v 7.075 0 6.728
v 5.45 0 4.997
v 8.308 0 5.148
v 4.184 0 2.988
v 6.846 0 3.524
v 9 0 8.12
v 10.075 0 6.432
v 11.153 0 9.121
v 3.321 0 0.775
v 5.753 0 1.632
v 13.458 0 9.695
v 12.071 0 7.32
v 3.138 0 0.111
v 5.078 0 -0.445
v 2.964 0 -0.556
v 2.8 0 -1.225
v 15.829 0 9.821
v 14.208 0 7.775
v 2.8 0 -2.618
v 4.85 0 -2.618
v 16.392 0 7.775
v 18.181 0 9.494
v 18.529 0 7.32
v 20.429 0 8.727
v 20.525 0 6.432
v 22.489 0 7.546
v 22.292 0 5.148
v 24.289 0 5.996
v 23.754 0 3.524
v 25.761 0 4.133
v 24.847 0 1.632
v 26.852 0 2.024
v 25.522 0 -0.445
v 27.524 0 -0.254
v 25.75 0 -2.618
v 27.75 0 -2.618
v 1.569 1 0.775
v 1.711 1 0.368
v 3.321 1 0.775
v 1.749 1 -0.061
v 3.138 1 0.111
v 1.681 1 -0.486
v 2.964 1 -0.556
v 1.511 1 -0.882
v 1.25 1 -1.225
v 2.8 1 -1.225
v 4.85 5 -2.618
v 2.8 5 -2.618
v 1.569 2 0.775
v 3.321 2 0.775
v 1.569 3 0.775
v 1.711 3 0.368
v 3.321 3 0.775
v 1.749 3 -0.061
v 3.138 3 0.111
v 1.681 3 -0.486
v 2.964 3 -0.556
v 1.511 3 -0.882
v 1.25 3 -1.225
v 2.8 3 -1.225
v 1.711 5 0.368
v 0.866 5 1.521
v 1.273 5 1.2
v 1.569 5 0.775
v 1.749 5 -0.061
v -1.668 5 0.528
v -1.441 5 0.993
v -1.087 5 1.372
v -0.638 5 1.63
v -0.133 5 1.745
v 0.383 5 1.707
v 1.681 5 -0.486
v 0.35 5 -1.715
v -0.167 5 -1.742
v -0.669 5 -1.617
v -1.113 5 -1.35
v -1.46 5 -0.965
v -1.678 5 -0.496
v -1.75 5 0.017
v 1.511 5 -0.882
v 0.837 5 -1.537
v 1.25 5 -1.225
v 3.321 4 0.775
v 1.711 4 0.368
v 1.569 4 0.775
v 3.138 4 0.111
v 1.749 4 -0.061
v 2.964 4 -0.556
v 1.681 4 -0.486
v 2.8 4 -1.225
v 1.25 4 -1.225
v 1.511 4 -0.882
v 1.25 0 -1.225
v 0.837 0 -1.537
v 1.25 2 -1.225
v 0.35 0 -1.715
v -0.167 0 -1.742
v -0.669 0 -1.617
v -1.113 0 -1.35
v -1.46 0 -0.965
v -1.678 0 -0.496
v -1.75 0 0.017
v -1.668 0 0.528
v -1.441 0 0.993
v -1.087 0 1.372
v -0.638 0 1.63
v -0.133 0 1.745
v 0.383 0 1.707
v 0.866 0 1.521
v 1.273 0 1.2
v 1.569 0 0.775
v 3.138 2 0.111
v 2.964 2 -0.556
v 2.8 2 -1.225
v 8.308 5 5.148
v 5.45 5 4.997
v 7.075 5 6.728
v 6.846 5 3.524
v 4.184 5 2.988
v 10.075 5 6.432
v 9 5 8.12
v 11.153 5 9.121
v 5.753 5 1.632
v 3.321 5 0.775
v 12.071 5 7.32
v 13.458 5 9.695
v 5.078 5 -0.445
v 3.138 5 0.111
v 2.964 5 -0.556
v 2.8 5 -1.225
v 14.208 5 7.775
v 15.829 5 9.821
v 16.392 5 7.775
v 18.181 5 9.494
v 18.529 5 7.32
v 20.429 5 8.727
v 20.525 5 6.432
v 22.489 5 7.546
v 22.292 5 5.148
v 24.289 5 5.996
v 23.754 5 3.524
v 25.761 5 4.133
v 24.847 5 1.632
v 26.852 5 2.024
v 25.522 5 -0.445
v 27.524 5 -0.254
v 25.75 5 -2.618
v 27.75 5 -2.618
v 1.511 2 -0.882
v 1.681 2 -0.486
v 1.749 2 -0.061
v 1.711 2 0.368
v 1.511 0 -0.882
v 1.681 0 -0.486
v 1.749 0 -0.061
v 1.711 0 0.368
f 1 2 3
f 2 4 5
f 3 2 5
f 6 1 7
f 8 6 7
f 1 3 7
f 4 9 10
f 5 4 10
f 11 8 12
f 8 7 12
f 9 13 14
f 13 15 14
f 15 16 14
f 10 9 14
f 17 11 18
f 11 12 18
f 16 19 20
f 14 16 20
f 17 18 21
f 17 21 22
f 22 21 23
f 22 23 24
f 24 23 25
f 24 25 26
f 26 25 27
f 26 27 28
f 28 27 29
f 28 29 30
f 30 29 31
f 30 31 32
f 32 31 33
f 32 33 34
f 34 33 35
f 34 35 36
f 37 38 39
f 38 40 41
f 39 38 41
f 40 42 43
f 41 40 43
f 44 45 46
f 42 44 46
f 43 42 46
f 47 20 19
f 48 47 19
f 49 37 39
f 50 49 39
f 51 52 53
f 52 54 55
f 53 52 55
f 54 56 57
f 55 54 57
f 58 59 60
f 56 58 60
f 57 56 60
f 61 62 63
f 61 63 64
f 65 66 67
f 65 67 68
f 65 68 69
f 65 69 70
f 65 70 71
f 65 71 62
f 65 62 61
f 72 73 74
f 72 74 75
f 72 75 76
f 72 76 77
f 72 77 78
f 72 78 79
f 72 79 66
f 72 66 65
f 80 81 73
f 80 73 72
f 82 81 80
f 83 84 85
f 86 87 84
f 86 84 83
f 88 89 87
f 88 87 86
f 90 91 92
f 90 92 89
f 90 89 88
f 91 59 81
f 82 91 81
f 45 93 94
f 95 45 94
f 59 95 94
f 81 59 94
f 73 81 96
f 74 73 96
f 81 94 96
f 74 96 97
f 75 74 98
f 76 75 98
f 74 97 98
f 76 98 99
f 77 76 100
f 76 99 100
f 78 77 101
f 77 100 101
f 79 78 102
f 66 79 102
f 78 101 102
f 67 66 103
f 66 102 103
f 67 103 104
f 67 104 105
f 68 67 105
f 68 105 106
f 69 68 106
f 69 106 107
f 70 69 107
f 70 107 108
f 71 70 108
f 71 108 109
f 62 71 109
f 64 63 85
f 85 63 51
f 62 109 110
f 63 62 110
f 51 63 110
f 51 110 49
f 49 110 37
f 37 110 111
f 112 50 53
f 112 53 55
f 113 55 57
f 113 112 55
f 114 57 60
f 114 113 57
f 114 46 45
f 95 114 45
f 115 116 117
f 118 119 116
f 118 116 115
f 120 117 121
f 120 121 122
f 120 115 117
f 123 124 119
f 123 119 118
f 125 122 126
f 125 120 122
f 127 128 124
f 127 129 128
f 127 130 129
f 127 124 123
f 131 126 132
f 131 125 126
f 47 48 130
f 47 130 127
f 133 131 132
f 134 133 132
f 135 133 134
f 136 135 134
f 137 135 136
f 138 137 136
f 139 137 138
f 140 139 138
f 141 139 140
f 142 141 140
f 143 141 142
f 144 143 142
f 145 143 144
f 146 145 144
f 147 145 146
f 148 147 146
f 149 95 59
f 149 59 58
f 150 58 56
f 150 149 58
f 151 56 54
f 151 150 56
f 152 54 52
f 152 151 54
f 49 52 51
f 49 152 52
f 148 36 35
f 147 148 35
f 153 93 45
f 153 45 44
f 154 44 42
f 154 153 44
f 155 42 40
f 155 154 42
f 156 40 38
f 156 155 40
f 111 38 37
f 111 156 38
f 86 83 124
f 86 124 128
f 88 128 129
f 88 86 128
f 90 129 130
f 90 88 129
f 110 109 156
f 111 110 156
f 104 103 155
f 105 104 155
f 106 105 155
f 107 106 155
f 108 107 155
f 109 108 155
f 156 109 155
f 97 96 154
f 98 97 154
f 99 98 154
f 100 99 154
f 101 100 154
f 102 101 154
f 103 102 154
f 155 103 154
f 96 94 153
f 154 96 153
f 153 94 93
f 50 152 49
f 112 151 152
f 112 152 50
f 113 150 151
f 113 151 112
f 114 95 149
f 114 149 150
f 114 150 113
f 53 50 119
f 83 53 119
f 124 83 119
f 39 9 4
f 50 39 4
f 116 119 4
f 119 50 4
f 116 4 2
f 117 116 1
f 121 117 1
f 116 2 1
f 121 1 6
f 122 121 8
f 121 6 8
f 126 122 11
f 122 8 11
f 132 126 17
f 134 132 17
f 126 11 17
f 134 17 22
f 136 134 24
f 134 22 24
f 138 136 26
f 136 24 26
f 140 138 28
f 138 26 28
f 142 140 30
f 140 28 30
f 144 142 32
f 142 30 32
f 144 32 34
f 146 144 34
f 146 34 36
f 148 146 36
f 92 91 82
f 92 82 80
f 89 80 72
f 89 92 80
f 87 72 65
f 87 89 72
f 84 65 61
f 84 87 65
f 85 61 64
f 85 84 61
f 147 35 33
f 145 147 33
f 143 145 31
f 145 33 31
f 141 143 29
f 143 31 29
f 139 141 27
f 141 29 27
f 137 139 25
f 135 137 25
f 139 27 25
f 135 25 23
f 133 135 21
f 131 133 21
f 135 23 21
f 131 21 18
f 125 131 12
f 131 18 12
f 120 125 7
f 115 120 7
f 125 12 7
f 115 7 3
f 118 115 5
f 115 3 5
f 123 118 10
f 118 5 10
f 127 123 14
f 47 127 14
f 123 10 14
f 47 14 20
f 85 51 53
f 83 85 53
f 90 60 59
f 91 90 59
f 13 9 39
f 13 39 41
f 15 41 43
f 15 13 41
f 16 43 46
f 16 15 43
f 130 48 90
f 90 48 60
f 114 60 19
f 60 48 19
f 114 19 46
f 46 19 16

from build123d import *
from build123d.topology import SkipClean

# Parameters (mm, degrees)
BOSS_EXTRUDE2_DEPTH = 5
CUT_EXTRUDE1_START  = -1
CUT_EXTRUDE1_DEPTH  = 1
CUT_EXTRUDE2_START  = -2
CUT_EXTRUDE2_DEPTH  = 1
CUT_EXTRUDE3_START  = -2
CUT_EXTRUDE3_DEPTH  = 1


with BuildPart() as part:
    # Sketch2 → Boss-Extrude2 (new body)
    with BuildSketch(Plane(origin=(0, 0, 0), x_dir=(1, 0, 0), z_dir=(0, 1, 0))):
        with BuildLine():
            Line((4.85, 2.618089507), (2.8, 2.618089507))
            Line((2.8, 2.618089507), (2.8, 1.224744871))
            Line((2.8, 1.224744871), (1.25, 1.224744871))
            ThreePointArc((1.25, 1.224744871), (-1.728167758, -0.275565237), (1.568910286, -0.775255129))
            Line((1.568910286, -0.775255129), (3.321364344, -0.775255129))
            ThreePointArc((3.321364344, -0.775255129), (17.012963234, -9.713506373), (27.75, 2.618089507))
            Line((27.75, 2.618089507), (25.75, 2.618089507))
            ThreePointArc((25.75, 2.618089507), (15.3, -7.831910493), (4.85, 2.618089507))
        make_face()
    extrude(amount=BOSS_EXTRUDE2_DEPTH)

    # Sketch6 → Cut-Extrude1 (cut)
    with SkipClean():  # the faces are left unmerged after this step: merging them gives an invalid solid
        with BuildSketch(Plane(origin=(0, 5, 0), x_dir=(1, 0, 0), z_dir=(0, 1, 0)).offset(CUT_EXTRUDE1_START)):
            with BuildLine():
                Line((2.8, 1.224744871), (1.25, 1.224744871))
                ThreePointArc((1.25, 1.224744871), (1.728167758, 0.275565237), (1.568910286, -0.775255129))
                Line((1.568910286, -0.775255129), (3.321364344, -0.775255129))
                ThreePointArc((3.321364344, -0.775255129), (3.050160005, 0.22200193), (2.8, 1.224744871))
            make_face()
        extrude(amount=CUT_EXTRUDE1_DEPTH, mode=Mode.SUBTRACT)

    # Sketch8 → Cut-Extrude2 (cut)
    with SkipClean():  # the faces are left unmerged after this step: merging them gives an invalid solid
        with BuildSketch(Plane(origin=(0, 4, 0), x_dir=(1, 0, 0), z_dir=(0, 1, 0)).offset(CUT_EXTRUDE2_START)):
            with BuildLine():
                Line((2.8, 1.224744871), (1.25, 1.224744871))
                ThreePointArc((1.25, 1.224744871), (1.728167758, 0.275565237), (1.568910286, -0.775255129))
                Line((1.568910286, -0.775255129), (3.321364344, -0.775255129))
                ThreePointArc((3.321364344, -0.775255129), (3.050160005, 0.22200193), (2.8, 1.224744871))
            make_face()
        extrude(amount=CUT_EXTRUDE2_DEPTH, mode=Mode.SUBTRACT)

    # Sketch9 → Cut-Extrude3 (cut)
    with SkipClean():  # the faces are left unmerged after this step: merging them gives an invalid solid
        with BuildSketch(Plane(origin=(0, 2, 0), x_dir=(1, 0, 0), z_dir=(0, 1, 0)).offset(CUT_EXTRUDE3_START)):
            with BuildLine():
                Line((2.8, 1.224744871), (1.25, 1.224744871))
                ThreePointArc((1.25, 1.224744871), (1.728167758, 0.275565237), (1.568910286, -0.775255129))
                Line((1.568910286, -0.775255129), (3.321364344, -0.775255129))
                ThreePointArc((3.321364344, -0.775255129), (3.050160005, 0.22200193), (2.8, 1.224744871))
            make_face()
        extrude(amount=CUT_EXTRUDE3_DEPTH, mode=Mode.SUBTRACT)


solid = part.part
